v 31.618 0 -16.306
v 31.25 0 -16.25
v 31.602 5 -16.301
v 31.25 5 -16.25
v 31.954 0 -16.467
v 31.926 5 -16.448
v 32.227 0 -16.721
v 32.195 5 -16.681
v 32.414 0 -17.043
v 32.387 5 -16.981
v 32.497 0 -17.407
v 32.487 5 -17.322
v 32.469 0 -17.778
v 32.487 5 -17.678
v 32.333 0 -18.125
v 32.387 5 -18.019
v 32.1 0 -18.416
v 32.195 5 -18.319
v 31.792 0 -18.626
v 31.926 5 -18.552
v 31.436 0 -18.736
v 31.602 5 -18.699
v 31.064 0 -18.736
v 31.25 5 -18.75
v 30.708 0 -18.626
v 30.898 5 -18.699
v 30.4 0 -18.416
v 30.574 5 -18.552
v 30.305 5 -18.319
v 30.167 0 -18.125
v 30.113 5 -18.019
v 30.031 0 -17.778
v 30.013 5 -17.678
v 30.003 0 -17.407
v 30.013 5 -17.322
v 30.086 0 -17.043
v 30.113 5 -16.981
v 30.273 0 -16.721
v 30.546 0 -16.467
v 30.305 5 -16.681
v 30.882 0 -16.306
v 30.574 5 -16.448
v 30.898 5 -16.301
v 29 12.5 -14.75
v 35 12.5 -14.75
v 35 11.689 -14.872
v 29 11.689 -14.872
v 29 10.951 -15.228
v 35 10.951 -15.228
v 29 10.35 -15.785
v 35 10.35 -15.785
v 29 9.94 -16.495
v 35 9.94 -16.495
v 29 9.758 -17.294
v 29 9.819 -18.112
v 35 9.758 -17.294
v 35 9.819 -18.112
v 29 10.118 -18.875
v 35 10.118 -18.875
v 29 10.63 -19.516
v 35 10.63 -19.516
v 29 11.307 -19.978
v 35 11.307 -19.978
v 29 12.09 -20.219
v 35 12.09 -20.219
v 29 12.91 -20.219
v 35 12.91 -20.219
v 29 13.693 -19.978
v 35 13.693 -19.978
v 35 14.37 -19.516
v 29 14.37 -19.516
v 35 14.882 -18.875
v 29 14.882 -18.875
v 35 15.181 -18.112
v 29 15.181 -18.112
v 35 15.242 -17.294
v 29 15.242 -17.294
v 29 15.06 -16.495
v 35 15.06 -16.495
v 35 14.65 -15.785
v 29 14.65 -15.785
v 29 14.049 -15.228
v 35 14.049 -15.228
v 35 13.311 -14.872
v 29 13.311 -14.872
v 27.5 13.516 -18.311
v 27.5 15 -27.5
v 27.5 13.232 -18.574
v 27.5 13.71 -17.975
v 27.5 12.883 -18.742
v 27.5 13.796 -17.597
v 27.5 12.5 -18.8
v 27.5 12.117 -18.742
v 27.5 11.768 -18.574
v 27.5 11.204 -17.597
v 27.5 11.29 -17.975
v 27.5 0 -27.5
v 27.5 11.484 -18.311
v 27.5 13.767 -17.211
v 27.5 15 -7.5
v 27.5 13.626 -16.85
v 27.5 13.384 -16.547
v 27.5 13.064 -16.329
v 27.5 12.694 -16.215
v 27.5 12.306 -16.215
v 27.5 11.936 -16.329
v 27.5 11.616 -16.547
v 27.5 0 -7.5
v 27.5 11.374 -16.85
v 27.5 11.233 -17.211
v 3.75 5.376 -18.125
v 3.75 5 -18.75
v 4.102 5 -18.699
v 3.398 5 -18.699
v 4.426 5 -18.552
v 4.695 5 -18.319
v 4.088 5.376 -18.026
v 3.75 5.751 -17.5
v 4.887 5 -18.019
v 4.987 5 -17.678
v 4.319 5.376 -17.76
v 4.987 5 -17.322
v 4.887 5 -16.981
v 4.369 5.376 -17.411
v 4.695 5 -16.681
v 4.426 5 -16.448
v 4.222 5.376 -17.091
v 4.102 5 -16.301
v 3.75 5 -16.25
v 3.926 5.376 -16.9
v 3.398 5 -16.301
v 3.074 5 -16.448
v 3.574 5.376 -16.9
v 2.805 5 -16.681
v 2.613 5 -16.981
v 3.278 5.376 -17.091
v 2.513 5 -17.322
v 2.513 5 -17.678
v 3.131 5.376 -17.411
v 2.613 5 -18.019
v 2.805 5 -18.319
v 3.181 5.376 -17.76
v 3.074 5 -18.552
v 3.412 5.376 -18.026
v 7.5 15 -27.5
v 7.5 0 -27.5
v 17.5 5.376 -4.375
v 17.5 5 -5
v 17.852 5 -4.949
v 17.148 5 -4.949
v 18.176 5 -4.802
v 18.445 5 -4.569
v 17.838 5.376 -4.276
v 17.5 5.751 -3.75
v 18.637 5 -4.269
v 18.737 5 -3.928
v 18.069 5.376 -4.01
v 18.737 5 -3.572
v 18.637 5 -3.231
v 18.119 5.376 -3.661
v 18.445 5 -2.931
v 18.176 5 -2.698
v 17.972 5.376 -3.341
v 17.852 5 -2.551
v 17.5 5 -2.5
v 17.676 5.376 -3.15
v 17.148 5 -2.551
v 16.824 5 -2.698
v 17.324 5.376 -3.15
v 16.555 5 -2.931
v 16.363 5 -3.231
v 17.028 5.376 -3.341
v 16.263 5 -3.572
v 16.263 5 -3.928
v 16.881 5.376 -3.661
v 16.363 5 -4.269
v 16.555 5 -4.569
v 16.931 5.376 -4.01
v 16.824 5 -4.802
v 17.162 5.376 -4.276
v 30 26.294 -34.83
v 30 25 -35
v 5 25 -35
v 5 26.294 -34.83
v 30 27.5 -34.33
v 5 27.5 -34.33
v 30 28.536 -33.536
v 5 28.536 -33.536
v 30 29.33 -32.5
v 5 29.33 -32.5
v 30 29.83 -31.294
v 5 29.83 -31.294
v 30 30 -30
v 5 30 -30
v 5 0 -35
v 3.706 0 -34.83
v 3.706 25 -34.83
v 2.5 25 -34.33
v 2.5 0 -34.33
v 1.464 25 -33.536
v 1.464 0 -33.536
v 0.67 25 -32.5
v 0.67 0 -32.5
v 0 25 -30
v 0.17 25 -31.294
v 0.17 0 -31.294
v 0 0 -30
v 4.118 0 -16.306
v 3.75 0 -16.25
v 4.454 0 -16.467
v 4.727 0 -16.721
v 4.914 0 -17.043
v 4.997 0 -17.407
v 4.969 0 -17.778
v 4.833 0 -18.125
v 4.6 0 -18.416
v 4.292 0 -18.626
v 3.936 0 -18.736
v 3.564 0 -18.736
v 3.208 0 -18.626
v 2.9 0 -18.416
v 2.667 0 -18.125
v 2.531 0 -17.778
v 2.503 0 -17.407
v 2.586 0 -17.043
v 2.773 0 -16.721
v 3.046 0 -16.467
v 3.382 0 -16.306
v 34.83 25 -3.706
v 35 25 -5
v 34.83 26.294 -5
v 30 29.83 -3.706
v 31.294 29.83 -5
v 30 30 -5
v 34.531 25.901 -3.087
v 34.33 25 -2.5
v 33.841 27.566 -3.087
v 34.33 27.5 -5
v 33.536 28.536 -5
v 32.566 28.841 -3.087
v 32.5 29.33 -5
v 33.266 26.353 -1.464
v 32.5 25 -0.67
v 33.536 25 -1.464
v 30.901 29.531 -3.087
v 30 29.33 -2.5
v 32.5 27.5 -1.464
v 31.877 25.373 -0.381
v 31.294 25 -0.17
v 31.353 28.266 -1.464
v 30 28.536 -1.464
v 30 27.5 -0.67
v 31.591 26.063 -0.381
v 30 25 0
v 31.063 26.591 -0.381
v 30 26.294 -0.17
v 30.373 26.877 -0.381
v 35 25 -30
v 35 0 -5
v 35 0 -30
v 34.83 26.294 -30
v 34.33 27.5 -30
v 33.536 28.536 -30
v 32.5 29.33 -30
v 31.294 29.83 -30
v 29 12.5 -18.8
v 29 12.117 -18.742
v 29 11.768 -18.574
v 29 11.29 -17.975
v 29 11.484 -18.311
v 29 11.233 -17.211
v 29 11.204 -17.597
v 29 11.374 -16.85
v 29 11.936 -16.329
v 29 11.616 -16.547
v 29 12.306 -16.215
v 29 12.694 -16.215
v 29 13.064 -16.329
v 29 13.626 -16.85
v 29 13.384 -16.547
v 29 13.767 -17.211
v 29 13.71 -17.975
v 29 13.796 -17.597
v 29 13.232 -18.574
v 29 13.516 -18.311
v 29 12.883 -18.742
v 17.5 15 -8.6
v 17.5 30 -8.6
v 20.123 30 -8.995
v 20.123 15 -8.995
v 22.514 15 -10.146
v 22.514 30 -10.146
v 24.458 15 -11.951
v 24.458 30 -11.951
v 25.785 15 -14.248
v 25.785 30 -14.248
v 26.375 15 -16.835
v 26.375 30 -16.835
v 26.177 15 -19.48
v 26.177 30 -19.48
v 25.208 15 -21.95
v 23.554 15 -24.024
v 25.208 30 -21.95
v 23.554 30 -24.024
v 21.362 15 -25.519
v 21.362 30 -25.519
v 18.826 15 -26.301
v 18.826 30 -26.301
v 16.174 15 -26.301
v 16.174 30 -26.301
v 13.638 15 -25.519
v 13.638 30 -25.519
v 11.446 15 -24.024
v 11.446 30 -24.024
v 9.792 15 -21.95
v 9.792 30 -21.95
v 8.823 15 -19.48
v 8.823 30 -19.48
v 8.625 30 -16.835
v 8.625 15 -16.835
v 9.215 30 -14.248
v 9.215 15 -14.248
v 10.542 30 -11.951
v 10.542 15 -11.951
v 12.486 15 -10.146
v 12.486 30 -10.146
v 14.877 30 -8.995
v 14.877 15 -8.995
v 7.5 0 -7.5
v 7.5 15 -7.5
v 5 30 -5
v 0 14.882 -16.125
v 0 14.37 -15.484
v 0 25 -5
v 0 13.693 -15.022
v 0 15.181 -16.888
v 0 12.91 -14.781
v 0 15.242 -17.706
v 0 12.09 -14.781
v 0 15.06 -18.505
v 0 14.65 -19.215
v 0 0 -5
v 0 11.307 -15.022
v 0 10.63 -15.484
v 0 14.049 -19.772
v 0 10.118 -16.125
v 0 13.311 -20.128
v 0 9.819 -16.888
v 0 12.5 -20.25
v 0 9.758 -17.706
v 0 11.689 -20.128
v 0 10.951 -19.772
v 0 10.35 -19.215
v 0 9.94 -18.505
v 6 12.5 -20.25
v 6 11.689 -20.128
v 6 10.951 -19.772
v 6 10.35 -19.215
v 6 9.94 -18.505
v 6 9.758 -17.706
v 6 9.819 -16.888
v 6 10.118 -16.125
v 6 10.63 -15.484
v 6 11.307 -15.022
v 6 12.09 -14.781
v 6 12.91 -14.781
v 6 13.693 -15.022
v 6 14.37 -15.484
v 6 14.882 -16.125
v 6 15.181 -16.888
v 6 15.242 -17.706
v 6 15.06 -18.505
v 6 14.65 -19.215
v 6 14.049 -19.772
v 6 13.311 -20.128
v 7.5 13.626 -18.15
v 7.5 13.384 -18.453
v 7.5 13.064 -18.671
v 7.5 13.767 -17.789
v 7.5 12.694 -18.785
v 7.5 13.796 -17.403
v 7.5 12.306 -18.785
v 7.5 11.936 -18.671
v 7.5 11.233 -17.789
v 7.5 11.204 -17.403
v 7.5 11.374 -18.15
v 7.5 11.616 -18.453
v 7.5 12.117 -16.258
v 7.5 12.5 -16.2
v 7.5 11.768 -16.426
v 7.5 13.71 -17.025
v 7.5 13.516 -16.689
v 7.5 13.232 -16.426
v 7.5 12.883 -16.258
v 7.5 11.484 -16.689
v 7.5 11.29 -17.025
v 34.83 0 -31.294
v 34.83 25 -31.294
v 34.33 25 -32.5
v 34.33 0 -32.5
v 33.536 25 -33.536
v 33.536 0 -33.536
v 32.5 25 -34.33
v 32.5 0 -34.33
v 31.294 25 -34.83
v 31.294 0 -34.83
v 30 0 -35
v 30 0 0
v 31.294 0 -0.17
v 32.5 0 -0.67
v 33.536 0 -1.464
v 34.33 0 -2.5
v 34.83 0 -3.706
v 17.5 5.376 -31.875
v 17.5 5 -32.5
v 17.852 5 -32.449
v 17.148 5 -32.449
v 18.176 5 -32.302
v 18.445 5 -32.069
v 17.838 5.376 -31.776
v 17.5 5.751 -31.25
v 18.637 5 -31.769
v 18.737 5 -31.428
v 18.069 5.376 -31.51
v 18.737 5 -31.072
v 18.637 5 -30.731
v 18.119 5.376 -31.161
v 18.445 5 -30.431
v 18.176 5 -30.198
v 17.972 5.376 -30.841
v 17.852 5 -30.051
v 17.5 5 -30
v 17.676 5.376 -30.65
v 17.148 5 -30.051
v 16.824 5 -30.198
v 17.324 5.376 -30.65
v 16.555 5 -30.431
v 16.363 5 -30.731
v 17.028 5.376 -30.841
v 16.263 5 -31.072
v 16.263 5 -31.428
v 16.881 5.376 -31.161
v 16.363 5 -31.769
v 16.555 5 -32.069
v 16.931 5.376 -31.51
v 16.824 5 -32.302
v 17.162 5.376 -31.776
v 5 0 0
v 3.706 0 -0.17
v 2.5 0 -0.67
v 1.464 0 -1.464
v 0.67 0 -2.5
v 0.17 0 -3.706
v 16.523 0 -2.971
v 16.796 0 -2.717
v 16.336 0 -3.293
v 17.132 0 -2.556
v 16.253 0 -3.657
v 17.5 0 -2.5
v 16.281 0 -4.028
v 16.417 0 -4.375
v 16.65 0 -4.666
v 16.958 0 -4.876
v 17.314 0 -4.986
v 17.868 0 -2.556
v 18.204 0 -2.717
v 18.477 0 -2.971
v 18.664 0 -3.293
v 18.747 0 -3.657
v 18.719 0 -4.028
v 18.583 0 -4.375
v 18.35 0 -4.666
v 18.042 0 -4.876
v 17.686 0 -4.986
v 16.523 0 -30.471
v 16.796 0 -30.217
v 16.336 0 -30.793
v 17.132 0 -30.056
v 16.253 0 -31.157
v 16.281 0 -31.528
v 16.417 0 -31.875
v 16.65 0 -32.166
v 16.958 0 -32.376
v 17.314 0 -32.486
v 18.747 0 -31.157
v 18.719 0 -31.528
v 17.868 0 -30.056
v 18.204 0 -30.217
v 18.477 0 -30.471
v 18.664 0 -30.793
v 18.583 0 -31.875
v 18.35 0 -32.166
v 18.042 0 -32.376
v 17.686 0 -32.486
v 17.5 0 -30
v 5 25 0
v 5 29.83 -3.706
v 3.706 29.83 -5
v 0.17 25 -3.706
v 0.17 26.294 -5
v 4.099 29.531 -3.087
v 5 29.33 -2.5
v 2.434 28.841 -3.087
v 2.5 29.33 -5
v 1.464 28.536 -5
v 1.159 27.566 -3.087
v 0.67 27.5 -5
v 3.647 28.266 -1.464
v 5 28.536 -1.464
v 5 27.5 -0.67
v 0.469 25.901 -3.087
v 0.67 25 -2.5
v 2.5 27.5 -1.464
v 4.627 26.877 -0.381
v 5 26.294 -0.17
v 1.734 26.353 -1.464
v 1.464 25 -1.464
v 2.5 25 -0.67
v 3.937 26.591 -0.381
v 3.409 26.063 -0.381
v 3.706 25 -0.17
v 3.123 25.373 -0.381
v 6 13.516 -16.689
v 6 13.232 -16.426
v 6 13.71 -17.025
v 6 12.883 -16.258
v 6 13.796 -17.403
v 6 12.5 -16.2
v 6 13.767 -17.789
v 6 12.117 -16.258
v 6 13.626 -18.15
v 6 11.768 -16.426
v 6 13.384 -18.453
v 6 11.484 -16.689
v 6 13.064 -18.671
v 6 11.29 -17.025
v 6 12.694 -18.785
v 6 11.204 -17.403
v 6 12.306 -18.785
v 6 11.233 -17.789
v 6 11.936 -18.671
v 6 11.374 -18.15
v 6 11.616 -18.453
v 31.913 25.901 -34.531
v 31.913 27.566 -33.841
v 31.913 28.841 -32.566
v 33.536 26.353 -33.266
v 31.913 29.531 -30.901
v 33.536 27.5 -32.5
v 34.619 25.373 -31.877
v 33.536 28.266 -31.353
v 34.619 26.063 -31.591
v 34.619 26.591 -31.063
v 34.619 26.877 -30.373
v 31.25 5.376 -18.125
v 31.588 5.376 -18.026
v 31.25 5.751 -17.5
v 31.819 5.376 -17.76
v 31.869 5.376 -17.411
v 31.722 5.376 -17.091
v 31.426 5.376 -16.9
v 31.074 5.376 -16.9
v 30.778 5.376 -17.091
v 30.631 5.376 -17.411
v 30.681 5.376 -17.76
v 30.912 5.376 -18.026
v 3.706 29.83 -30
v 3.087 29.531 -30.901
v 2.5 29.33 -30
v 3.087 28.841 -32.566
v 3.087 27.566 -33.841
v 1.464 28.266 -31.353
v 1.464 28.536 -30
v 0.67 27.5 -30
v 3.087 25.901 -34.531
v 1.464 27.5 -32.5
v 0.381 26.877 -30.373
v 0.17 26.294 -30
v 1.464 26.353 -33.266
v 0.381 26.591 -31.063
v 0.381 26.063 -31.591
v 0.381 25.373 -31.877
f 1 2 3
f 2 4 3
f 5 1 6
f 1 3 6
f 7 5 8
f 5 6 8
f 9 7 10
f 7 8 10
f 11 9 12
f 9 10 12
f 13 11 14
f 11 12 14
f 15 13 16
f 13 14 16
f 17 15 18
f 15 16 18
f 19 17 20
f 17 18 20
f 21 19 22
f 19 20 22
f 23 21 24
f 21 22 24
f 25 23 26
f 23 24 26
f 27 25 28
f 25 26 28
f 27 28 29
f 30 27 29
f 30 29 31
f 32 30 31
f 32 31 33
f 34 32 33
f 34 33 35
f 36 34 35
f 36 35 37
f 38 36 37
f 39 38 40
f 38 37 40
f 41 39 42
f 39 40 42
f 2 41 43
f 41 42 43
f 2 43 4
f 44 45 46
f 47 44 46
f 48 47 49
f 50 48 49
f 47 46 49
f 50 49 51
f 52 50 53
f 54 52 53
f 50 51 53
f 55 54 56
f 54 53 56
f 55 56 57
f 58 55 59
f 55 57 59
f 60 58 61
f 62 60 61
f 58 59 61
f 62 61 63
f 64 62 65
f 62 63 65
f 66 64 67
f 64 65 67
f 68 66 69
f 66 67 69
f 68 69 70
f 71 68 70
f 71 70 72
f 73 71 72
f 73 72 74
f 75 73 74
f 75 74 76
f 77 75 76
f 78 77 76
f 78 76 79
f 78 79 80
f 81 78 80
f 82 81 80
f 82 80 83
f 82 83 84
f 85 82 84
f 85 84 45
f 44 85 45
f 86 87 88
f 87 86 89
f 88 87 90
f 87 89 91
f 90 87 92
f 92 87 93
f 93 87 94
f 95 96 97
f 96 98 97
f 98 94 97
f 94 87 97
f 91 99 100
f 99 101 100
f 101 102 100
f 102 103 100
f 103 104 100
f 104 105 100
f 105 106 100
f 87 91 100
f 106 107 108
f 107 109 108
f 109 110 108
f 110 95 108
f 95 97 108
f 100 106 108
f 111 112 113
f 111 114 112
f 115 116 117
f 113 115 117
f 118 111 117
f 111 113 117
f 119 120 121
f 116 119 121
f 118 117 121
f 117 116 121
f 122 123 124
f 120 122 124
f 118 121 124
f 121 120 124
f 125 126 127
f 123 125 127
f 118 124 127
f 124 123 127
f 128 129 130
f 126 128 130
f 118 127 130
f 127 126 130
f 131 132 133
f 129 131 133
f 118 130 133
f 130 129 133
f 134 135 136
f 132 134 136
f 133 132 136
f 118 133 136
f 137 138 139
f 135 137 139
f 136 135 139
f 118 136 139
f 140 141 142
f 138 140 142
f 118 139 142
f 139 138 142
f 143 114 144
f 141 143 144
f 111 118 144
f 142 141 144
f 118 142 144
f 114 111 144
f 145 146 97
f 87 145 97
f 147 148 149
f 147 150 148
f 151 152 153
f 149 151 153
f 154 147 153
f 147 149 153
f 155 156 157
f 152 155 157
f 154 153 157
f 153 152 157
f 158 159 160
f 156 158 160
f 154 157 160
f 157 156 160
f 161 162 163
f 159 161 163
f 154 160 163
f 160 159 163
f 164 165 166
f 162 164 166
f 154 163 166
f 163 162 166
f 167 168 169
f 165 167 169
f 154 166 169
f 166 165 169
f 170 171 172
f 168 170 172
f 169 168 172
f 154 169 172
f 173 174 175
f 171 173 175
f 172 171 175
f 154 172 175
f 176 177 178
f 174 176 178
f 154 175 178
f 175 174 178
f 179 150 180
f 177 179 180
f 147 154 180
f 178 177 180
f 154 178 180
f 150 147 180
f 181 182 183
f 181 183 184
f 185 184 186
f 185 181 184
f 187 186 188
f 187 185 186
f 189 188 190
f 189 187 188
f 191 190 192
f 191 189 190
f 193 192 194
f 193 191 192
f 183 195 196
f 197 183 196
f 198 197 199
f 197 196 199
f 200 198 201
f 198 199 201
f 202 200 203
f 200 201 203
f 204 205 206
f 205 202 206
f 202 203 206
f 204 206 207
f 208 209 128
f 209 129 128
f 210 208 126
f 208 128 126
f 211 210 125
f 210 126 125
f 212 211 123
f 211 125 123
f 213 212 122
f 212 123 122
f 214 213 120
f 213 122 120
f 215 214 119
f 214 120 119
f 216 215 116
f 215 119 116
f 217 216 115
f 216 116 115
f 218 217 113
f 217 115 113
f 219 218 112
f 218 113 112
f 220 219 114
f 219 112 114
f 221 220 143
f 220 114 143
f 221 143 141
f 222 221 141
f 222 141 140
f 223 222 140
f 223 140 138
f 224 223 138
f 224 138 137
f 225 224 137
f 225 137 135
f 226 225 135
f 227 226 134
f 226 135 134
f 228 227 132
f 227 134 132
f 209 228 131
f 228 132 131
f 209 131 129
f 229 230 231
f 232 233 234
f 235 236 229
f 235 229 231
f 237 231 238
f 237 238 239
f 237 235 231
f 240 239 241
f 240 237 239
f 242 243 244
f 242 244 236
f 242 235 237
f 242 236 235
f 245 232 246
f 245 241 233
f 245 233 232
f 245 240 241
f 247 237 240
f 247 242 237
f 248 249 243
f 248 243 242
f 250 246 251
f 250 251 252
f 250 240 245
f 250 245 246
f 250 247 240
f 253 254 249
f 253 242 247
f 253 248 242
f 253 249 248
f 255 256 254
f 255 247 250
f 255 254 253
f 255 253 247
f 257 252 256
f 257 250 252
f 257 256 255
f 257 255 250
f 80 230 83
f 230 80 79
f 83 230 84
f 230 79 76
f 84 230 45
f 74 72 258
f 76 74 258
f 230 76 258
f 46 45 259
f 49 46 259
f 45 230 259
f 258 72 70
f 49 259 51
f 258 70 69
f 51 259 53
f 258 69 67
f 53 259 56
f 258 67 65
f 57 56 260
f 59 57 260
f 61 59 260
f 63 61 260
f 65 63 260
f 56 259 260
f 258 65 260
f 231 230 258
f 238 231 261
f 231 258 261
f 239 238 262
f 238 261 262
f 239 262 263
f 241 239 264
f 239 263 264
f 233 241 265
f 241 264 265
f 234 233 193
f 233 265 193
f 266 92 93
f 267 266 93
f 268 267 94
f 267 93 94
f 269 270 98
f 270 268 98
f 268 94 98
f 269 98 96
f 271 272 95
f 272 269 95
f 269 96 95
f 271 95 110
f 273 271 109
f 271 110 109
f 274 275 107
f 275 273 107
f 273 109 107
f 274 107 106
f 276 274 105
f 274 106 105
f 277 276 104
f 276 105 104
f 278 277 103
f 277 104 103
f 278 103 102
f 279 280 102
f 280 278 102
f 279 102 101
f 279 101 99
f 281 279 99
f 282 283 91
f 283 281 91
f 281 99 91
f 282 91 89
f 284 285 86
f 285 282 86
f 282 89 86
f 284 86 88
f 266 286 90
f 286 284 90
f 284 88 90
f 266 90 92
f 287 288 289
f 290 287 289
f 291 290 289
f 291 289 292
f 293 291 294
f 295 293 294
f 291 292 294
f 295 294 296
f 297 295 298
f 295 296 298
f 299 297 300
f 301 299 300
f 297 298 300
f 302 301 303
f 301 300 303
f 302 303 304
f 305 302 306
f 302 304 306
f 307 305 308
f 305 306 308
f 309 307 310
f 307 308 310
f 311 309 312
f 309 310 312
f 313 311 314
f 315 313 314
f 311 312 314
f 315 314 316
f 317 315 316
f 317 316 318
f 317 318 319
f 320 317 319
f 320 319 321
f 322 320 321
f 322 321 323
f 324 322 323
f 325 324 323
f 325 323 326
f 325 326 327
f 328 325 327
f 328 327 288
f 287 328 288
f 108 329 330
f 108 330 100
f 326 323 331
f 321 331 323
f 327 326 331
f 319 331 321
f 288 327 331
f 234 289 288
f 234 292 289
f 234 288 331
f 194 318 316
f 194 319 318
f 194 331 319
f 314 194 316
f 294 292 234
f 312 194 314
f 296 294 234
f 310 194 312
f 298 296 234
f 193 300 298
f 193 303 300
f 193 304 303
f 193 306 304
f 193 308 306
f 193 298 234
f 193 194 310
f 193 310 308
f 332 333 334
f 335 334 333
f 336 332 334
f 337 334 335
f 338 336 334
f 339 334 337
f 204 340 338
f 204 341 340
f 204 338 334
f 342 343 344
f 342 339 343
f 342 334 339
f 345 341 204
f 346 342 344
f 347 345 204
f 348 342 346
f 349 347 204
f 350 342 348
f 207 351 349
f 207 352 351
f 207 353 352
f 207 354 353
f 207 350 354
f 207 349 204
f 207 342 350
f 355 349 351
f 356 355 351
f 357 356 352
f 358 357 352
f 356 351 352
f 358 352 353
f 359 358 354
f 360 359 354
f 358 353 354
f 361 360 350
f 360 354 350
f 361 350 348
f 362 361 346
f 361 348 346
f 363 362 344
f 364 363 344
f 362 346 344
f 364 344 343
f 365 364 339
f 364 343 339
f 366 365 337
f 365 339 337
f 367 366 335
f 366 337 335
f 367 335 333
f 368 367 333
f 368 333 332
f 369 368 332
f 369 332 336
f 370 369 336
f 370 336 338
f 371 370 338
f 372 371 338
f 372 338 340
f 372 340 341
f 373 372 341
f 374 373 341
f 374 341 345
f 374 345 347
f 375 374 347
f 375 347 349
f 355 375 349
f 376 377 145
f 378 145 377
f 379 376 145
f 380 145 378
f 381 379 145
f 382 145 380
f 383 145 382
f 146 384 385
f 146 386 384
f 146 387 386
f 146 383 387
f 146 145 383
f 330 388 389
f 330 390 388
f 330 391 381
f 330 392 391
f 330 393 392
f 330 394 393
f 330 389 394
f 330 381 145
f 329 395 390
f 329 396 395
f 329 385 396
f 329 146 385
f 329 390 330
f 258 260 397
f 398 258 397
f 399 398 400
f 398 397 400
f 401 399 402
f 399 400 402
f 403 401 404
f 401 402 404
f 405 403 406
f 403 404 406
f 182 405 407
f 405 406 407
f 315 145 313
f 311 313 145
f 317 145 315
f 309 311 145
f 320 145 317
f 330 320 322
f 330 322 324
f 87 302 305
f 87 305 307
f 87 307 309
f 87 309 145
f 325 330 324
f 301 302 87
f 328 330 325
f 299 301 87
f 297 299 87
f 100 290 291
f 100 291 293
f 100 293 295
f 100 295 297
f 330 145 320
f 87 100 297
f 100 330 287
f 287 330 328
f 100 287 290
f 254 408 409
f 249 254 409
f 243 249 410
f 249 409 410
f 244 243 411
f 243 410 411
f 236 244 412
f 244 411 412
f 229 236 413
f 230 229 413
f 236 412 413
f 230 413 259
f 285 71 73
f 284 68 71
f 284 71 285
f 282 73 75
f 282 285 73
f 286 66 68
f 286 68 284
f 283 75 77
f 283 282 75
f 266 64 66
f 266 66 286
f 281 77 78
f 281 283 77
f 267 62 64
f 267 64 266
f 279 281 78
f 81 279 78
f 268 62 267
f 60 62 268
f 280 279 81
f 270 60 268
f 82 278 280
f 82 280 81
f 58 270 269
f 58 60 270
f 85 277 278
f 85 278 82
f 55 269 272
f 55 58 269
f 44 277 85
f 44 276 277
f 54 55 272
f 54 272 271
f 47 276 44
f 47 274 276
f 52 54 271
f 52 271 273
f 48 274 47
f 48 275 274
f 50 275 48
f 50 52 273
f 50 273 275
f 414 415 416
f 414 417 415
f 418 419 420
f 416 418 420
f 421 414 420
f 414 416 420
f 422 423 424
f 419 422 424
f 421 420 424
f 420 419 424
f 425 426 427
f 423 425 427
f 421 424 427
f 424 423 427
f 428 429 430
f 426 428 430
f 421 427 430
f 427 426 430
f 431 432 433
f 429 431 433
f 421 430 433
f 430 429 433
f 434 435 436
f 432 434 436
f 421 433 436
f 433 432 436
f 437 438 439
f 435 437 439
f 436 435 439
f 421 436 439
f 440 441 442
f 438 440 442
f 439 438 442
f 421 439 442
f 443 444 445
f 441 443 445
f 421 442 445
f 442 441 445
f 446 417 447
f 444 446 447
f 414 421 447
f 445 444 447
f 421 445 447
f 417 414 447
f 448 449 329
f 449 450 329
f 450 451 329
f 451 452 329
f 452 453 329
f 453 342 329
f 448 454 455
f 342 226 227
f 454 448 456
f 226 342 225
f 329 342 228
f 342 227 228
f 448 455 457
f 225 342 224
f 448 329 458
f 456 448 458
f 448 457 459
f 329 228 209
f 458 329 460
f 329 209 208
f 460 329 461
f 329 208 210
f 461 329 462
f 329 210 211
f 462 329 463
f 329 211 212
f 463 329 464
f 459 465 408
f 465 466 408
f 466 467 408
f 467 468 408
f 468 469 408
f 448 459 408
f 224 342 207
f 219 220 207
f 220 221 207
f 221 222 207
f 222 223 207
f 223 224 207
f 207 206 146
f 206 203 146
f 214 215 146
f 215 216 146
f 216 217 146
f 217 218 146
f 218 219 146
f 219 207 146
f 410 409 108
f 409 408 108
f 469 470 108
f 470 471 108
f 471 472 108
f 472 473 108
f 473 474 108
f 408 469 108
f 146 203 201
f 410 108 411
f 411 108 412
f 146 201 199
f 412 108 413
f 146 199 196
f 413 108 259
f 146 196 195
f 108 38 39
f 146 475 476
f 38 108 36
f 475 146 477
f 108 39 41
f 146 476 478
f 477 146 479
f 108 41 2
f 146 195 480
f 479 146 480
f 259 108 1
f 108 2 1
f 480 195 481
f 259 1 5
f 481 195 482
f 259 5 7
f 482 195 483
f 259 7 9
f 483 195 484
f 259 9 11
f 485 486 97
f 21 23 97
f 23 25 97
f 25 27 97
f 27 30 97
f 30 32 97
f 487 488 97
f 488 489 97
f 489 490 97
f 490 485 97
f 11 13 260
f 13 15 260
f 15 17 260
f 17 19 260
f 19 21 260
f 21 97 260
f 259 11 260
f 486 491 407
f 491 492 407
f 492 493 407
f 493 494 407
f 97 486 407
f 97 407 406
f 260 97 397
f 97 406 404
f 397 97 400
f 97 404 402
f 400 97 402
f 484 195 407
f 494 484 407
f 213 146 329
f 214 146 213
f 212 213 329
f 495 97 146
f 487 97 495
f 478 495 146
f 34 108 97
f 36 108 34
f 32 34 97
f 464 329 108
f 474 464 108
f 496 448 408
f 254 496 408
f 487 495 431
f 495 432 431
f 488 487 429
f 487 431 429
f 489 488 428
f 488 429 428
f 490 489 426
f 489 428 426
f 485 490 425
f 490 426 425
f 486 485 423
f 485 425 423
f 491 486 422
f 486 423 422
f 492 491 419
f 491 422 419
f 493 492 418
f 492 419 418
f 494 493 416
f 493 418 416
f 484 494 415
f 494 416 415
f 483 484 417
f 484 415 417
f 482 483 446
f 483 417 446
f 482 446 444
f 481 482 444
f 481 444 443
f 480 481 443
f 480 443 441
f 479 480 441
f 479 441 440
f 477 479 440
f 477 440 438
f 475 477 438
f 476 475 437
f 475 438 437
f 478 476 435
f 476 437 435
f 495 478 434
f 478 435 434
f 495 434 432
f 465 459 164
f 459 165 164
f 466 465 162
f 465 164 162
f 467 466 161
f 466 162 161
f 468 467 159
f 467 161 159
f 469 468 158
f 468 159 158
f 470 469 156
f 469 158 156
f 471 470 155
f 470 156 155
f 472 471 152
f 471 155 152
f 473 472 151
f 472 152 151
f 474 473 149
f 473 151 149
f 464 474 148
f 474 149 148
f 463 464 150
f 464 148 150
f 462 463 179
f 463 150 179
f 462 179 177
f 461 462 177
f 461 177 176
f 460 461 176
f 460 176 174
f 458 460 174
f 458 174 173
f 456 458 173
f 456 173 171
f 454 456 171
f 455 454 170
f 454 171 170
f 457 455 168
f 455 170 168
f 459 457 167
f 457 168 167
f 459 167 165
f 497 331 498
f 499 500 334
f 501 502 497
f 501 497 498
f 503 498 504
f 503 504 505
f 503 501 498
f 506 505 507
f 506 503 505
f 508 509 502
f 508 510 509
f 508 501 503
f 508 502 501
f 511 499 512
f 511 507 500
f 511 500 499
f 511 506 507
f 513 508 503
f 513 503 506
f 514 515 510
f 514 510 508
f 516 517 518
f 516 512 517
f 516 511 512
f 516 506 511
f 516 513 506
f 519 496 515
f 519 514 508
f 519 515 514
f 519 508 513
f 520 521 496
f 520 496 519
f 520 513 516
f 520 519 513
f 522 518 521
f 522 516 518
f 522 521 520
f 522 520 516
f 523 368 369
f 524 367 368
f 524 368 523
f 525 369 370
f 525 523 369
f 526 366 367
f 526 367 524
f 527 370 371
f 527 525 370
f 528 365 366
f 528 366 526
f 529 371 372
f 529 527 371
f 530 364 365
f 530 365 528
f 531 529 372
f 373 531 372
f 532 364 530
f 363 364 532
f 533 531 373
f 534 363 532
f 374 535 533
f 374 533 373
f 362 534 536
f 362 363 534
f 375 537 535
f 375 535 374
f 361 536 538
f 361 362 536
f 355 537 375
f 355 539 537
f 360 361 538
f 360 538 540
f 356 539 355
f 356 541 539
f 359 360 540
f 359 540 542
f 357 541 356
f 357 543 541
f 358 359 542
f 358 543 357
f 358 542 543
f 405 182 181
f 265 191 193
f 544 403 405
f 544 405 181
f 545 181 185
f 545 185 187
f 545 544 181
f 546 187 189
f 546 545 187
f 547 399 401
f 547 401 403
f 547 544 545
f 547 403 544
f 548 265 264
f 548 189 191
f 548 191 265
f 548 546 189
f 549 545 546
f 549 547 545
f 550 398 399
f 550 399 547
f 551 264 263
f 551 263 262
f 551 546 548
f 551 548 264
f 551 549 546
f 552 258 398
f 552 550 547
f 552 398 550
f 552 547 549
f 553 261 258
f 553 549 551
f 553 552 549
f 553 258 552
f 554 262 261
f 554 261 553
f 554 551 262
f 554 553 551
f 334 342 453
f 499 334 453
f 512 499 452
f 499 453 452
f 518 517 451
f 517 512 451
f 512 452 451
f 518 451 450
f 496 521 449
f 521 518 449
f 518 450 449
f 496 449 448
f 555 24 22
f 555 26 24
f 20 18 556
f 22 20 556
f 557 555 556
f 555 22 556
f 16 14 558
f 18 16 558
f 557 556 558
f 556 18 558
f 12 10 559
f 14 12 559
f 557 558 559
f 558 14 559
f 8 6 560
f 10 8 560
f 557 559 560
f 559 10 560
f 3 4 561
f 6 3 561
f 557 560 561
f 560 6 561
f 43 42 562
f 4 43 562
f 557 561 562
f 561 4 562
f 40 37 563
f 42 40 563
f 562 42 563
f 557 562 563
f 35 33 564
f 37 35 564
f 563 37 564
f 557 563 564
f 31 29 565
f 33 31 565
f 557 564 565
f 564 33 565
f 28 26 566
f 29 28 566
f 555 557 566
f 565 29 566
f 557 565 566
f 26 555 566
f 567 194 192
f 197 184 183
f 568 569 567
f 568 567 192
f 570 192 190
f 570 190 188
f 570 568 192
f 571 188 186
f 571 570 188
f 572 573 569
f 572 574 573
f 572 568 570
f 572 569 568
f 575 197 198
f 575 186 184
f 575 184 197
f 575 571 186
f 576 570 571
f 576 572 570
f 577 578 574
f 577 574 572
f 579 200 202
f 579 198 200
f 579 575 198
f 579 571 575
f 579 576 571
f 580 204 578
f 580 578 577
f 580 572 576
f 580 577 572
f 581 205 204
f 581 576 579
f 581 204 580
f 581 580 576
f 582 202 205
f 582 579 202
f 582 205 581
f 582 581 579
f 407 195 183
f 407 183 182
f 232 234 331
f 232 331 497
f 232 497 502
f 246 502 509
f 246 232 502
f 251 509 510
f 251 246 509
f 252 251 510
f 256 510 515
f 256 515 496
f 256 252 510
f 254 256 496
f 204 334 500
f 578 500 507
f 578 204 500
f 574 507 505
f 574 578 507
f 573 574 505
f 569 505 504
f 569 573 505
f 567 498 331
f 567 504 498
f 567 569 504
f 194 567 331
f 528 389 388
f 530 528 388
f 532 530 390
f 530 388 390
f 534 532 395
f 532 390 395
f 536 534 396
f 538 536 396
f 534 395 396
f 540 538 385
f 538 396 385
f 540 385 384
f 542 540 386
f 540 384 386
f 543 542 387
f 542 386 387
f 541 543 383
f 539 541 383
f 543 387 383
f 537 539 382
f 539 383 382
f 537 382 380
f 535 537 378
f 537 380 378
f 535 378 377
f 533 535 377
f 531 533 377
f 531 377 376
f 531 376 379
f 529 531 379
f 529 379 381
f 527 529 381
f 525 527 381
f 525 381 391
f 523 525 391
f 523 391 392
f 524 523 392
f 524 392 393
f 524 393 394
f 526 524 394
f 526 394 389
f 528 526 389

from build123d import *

# Parameters (mm, degrees)
SKETCH1_W                      = 35
SKETCH1_H                      = 35
BOSS_EXTRUDE1_DEPTH            = 30
SKETCH2_W                      = 20
SKETCH2_H                      = 20
CUT_EXTRUDE1_DEPTH             = 15
SKETCH3_R                      = 8.9
CUT_EXTRUDE2_DEPTH             = 58.879184514
CBORE_FOR_M2_SHCS1_D           = 2.6
CBORE_FOR_M2_SHCS1_DEPTH       = 7.5
CBORE_FOR_M2_SHCS1_CBORE_D     = 5.5
CBORE_FOR_M2_SHCS1_CBORE_DEPTH = 6
CBORE_FOR_M2_SHCS2_D           = 2.6
CBORE_FOR_M2_SHCS2_CBORE_D     = 5.5
CBORE_FOR_M2_SHCS2_CBORE_DEPTH = 6
FILLET1_R                      = 5
FILLET2_R                      = 5
M3X0_5_TAPPED_HOLE1_D          = 2.5
M3X0_5_TAPPED_HOLE1_DEPTH      = 5
M3X0_5_TAPPED_HOLE1_TIP        = 0.751075774


with BuildPart() as part:
    # Sketch1 → Boss-Extrude1 (new body)
    with BuildSketch(Plane(origin=(0, 0, 0), x_dir=(1, 0, 0), z_dir=(0, 1, 0))):
        with Locations((17.5, 17.5)):
            Rectangle(SKETCH1_W, SKETCH1_H)
    extrude(amount=BOSS_EXTRUDE1_DEPTH)

    # Sketch2 → Cut-Extrude1 (cut)
    with BuildSketch(Plane.XZ):
        with Locations((17.5, -17.5)):
            Rectangle(SKETCH2_W, SKETCH2_H)
    extrude(amount=-CUT_EXTRUDE1_DEPTH, mode=Mode.SUBTRACT)

    # Sketch3 → Cut-Extrude2 (cut, through all)
    with BuildSketch(Plane(origin=(0, 30, 0), x_dir=(1, 0, 0), z_dir=(0, 1, 0))):
        with Locations(Location((17.5, 17.5, 0), (0, 0, 270))):
            Circle(SKETCH3_R)
    extrude(amount=-CUT_EXTRUDE2_DEPTH, mode=Mode.SUBTRACT)

    # CBORE for M2 SHCS1
    with Locations(Plane(origin=(35, 12.5, -17.5), x_dir=(0, 0, 1), z_dir=(1, 0, 0))):
        with Locations((0, 0)):
            CounterBoreHole(CBORE_FOR_M2_SHCS1_D / 2, CBORE_FOR_M2_SHCS1_CBORE_D / 2, CBORE_FOR_M2_SHCS1_CBORE_DEPTH, depth=CBORE_FOR_M2_SHCS1_DEPTH)

    # CBORE for M2 SHCS2 (through all)
    with Locations(Plane(origin=(0, 12.5, -17.5), x_dir=(0, 0, -1), z_dir=(-1, 0, 0))):
        with Locations((0, 0)):
            CounterBoreHole(CBORE_FOR_M2_SHCS2_D / 2, CBORE_FOR_M2_SHCS2_CBORE_D / 2, CBORE_FOR_M2_SHCS2_CBORE_DEPTH)

    # Fillet1
    fillet1_edges = [part.edges().sort_by_distance(p)[0] for p in [
        (35, 30, -17.5),
        (17.5, 30, -35),
        (0, 30, -17.5),
        (17.5, 30, 0),
    ]]
    fillet(fillet1_edges, radius=FILLET1_R)

    # Fillet2
    # the kernel refuses this fillet: 5 mm, written as the material it takes off along each edge
    with BuildSketch(Plane(origin=(30, 25, -30), x_dir=(0, 0, -1), z_dir=(1, 0, 0))) as fillet2_piece_1_section:
        Polygon((0, 0), (FILLET2_R, 0), (FILLET2_R, FILLET2_R), (0, FILLET2_R), align=None)
    fillet2_piece_1 = extrude(amount=FILLET2_R, mode=Mode.PRIVATE)
    fillet2_piece_1 = fillet2_piece_1 - Plane(origin=(30, 25, -30), x_dir=(0, -0.7071067811865475, 0.7071067811865475), z_dir=(1, 0, 0)) * Sphere(FILLET2_R, mode=Mode.PRIVATE)
    add(fillet2_piece_1, mode=Mode.SUBTRACT)
    with BuildSketch(Plane(origin=(30, 25, -5), x_dir=(1, 0, 0), z_dir=(0, 0, 1))) as fillet2_piece_2_section:
        Polygon((0, 0), (FILLET2_R, 0), (FILLET2_R, FILLET2_R), (0, FILLET2_R), align=None)
    fillet2_piece_2 = extrude(amount=FILLET2_R, mode=Mode.PRIVATE)
    fillet2_piece_2 = fillet2_piece_2 - Plane(origin=(30, 25, -5), x_dir=(-0.7071067811865475, -0.7071067811865475, 0), z_dir=(0, 0, 1)) * Sphere(FILLET2_R, mode=Mode.PRIVATE)
    add(fillet2_piece_2, mode=Mode.SUBTRACT)
    with BuildSketch(Plane(origin=(5, 25, -30), x_dir=(0, 0, -1), z_dir=(-1, 0, 0))) as fillet2_piece_3_section:
        Polygon((0, 0), (FILLET2_R, 0), (FILLET2_R, -FILLET2_R), (0, -FILLET2_R), align=None)
    fillet2_piece_3 = extrude(amount=FILLET2_R, mode=Mode.PRIVATE)
    fillet2_piece_3 = fillet2_piece_3 - Plane(origin=(5, 25, -30), x_dir=(0, -0.7071067811865475, 0.7071067811865475), z_dir=(-1, 0, 0)) * Sphere(FILLET2_R, mode=Mode.PRIVATE)
    add(fillet2_piece_3, mode=Mode.SUBTRACT)
    with BuildSketch(Plane(origin=(5, 25, -5), x_dir=(-1, 0, 0), z_dir=(0, 0, 1))) as fillet2_piece_4_section:
        Polygon((0, 0), (FILLET2_R, 0), (FILLET2_R, -FILLET2_R), (0, -FILLET2_R), align=None)
    fillet2_piece_4 = extrude(amount=FILLET2_R, mode=Mode.PRIVATE)
    fillet2_piece_4 = fillet2_piece_4 - Plane(origin=(5, 25, -5), x_dir=(0.7071067811865475, -0.7071067811865475, 0), z_dir=(0, 0, 1)) * Sphere(FILLET2_R, mode=Mode.PRIVATE)
    add(fillet2_piece_4, mode=Mode.SUBTRACT)
    with BuildSketch(Plane(origin=(0, -12.5, 0), x_dir=(1, 0, 0), z_dir=(0, 1, 0)), Plane(origin=(0, -12.5, -35), x_dir=(0, 0, 1), z_dir=(0, 1, 0))) as fillet2_piece_5:
        with BuildLine():
            CenterArc((FILLET2_R, FILLET2_R), FILLET2_R, 180, 90)
            Line((0, FILLET2_R), (0, 0))
            Line((0, 0), (FILLET2_R, 0))
        make_face()
    extrude(amount=37.5, mode=Mode.SUBTRACT)
    with BuildSketch(Plane(origin=(35, -12.5, -35), x_dir=(0, 0, 1), z_dir=(0, 1, 0)), Plane(origin=(35, -12.5, 0), x_dir=(-1, 0, 0), z_dir=(0, 1, 0))) as fillet2_piece_6:
        with BuildLine():
            CenterArc((FILLET2_R, -FILLET2_R), FILLET2_R, 90, 90)
            Line((0, -FILLET2_R), (0, 0))
            Line((0, 0), (FILLET2_R, 0))
        make_face()
    extrude(amount=37.5, mode=Mode.SUBTRACT)

    # M3x0.5 Tapped Hole1
    with Locations(Plane(origin=(17.5, 0, -31.25), x_dir=(0, 0, -1), z_dir=(0, -1, 0))):
        with Locations((0, 0), (-13.75, -13.75), (-27.5, 0), (-13.75, 13.75)):
            Hole(M3X0_5_TAPPED_HOLE1_D / 2, depth=M3X0_5_TAPPED_HOLE1_DEPTH)
            with Locations((0, 0, -(M3X0_5_TAPPED_HOLE1_DEPTH + M3X0_5_TAPPED_HOLE1_TIP / 2))):  # 118° drill point
                Cone(0, M3X0_5_TAPPED_HOLE1_D / 2, M3X0_5_TAPPED_HOLE1_TIP, mode=Mode.SUBTRACT)


solid = part.part
